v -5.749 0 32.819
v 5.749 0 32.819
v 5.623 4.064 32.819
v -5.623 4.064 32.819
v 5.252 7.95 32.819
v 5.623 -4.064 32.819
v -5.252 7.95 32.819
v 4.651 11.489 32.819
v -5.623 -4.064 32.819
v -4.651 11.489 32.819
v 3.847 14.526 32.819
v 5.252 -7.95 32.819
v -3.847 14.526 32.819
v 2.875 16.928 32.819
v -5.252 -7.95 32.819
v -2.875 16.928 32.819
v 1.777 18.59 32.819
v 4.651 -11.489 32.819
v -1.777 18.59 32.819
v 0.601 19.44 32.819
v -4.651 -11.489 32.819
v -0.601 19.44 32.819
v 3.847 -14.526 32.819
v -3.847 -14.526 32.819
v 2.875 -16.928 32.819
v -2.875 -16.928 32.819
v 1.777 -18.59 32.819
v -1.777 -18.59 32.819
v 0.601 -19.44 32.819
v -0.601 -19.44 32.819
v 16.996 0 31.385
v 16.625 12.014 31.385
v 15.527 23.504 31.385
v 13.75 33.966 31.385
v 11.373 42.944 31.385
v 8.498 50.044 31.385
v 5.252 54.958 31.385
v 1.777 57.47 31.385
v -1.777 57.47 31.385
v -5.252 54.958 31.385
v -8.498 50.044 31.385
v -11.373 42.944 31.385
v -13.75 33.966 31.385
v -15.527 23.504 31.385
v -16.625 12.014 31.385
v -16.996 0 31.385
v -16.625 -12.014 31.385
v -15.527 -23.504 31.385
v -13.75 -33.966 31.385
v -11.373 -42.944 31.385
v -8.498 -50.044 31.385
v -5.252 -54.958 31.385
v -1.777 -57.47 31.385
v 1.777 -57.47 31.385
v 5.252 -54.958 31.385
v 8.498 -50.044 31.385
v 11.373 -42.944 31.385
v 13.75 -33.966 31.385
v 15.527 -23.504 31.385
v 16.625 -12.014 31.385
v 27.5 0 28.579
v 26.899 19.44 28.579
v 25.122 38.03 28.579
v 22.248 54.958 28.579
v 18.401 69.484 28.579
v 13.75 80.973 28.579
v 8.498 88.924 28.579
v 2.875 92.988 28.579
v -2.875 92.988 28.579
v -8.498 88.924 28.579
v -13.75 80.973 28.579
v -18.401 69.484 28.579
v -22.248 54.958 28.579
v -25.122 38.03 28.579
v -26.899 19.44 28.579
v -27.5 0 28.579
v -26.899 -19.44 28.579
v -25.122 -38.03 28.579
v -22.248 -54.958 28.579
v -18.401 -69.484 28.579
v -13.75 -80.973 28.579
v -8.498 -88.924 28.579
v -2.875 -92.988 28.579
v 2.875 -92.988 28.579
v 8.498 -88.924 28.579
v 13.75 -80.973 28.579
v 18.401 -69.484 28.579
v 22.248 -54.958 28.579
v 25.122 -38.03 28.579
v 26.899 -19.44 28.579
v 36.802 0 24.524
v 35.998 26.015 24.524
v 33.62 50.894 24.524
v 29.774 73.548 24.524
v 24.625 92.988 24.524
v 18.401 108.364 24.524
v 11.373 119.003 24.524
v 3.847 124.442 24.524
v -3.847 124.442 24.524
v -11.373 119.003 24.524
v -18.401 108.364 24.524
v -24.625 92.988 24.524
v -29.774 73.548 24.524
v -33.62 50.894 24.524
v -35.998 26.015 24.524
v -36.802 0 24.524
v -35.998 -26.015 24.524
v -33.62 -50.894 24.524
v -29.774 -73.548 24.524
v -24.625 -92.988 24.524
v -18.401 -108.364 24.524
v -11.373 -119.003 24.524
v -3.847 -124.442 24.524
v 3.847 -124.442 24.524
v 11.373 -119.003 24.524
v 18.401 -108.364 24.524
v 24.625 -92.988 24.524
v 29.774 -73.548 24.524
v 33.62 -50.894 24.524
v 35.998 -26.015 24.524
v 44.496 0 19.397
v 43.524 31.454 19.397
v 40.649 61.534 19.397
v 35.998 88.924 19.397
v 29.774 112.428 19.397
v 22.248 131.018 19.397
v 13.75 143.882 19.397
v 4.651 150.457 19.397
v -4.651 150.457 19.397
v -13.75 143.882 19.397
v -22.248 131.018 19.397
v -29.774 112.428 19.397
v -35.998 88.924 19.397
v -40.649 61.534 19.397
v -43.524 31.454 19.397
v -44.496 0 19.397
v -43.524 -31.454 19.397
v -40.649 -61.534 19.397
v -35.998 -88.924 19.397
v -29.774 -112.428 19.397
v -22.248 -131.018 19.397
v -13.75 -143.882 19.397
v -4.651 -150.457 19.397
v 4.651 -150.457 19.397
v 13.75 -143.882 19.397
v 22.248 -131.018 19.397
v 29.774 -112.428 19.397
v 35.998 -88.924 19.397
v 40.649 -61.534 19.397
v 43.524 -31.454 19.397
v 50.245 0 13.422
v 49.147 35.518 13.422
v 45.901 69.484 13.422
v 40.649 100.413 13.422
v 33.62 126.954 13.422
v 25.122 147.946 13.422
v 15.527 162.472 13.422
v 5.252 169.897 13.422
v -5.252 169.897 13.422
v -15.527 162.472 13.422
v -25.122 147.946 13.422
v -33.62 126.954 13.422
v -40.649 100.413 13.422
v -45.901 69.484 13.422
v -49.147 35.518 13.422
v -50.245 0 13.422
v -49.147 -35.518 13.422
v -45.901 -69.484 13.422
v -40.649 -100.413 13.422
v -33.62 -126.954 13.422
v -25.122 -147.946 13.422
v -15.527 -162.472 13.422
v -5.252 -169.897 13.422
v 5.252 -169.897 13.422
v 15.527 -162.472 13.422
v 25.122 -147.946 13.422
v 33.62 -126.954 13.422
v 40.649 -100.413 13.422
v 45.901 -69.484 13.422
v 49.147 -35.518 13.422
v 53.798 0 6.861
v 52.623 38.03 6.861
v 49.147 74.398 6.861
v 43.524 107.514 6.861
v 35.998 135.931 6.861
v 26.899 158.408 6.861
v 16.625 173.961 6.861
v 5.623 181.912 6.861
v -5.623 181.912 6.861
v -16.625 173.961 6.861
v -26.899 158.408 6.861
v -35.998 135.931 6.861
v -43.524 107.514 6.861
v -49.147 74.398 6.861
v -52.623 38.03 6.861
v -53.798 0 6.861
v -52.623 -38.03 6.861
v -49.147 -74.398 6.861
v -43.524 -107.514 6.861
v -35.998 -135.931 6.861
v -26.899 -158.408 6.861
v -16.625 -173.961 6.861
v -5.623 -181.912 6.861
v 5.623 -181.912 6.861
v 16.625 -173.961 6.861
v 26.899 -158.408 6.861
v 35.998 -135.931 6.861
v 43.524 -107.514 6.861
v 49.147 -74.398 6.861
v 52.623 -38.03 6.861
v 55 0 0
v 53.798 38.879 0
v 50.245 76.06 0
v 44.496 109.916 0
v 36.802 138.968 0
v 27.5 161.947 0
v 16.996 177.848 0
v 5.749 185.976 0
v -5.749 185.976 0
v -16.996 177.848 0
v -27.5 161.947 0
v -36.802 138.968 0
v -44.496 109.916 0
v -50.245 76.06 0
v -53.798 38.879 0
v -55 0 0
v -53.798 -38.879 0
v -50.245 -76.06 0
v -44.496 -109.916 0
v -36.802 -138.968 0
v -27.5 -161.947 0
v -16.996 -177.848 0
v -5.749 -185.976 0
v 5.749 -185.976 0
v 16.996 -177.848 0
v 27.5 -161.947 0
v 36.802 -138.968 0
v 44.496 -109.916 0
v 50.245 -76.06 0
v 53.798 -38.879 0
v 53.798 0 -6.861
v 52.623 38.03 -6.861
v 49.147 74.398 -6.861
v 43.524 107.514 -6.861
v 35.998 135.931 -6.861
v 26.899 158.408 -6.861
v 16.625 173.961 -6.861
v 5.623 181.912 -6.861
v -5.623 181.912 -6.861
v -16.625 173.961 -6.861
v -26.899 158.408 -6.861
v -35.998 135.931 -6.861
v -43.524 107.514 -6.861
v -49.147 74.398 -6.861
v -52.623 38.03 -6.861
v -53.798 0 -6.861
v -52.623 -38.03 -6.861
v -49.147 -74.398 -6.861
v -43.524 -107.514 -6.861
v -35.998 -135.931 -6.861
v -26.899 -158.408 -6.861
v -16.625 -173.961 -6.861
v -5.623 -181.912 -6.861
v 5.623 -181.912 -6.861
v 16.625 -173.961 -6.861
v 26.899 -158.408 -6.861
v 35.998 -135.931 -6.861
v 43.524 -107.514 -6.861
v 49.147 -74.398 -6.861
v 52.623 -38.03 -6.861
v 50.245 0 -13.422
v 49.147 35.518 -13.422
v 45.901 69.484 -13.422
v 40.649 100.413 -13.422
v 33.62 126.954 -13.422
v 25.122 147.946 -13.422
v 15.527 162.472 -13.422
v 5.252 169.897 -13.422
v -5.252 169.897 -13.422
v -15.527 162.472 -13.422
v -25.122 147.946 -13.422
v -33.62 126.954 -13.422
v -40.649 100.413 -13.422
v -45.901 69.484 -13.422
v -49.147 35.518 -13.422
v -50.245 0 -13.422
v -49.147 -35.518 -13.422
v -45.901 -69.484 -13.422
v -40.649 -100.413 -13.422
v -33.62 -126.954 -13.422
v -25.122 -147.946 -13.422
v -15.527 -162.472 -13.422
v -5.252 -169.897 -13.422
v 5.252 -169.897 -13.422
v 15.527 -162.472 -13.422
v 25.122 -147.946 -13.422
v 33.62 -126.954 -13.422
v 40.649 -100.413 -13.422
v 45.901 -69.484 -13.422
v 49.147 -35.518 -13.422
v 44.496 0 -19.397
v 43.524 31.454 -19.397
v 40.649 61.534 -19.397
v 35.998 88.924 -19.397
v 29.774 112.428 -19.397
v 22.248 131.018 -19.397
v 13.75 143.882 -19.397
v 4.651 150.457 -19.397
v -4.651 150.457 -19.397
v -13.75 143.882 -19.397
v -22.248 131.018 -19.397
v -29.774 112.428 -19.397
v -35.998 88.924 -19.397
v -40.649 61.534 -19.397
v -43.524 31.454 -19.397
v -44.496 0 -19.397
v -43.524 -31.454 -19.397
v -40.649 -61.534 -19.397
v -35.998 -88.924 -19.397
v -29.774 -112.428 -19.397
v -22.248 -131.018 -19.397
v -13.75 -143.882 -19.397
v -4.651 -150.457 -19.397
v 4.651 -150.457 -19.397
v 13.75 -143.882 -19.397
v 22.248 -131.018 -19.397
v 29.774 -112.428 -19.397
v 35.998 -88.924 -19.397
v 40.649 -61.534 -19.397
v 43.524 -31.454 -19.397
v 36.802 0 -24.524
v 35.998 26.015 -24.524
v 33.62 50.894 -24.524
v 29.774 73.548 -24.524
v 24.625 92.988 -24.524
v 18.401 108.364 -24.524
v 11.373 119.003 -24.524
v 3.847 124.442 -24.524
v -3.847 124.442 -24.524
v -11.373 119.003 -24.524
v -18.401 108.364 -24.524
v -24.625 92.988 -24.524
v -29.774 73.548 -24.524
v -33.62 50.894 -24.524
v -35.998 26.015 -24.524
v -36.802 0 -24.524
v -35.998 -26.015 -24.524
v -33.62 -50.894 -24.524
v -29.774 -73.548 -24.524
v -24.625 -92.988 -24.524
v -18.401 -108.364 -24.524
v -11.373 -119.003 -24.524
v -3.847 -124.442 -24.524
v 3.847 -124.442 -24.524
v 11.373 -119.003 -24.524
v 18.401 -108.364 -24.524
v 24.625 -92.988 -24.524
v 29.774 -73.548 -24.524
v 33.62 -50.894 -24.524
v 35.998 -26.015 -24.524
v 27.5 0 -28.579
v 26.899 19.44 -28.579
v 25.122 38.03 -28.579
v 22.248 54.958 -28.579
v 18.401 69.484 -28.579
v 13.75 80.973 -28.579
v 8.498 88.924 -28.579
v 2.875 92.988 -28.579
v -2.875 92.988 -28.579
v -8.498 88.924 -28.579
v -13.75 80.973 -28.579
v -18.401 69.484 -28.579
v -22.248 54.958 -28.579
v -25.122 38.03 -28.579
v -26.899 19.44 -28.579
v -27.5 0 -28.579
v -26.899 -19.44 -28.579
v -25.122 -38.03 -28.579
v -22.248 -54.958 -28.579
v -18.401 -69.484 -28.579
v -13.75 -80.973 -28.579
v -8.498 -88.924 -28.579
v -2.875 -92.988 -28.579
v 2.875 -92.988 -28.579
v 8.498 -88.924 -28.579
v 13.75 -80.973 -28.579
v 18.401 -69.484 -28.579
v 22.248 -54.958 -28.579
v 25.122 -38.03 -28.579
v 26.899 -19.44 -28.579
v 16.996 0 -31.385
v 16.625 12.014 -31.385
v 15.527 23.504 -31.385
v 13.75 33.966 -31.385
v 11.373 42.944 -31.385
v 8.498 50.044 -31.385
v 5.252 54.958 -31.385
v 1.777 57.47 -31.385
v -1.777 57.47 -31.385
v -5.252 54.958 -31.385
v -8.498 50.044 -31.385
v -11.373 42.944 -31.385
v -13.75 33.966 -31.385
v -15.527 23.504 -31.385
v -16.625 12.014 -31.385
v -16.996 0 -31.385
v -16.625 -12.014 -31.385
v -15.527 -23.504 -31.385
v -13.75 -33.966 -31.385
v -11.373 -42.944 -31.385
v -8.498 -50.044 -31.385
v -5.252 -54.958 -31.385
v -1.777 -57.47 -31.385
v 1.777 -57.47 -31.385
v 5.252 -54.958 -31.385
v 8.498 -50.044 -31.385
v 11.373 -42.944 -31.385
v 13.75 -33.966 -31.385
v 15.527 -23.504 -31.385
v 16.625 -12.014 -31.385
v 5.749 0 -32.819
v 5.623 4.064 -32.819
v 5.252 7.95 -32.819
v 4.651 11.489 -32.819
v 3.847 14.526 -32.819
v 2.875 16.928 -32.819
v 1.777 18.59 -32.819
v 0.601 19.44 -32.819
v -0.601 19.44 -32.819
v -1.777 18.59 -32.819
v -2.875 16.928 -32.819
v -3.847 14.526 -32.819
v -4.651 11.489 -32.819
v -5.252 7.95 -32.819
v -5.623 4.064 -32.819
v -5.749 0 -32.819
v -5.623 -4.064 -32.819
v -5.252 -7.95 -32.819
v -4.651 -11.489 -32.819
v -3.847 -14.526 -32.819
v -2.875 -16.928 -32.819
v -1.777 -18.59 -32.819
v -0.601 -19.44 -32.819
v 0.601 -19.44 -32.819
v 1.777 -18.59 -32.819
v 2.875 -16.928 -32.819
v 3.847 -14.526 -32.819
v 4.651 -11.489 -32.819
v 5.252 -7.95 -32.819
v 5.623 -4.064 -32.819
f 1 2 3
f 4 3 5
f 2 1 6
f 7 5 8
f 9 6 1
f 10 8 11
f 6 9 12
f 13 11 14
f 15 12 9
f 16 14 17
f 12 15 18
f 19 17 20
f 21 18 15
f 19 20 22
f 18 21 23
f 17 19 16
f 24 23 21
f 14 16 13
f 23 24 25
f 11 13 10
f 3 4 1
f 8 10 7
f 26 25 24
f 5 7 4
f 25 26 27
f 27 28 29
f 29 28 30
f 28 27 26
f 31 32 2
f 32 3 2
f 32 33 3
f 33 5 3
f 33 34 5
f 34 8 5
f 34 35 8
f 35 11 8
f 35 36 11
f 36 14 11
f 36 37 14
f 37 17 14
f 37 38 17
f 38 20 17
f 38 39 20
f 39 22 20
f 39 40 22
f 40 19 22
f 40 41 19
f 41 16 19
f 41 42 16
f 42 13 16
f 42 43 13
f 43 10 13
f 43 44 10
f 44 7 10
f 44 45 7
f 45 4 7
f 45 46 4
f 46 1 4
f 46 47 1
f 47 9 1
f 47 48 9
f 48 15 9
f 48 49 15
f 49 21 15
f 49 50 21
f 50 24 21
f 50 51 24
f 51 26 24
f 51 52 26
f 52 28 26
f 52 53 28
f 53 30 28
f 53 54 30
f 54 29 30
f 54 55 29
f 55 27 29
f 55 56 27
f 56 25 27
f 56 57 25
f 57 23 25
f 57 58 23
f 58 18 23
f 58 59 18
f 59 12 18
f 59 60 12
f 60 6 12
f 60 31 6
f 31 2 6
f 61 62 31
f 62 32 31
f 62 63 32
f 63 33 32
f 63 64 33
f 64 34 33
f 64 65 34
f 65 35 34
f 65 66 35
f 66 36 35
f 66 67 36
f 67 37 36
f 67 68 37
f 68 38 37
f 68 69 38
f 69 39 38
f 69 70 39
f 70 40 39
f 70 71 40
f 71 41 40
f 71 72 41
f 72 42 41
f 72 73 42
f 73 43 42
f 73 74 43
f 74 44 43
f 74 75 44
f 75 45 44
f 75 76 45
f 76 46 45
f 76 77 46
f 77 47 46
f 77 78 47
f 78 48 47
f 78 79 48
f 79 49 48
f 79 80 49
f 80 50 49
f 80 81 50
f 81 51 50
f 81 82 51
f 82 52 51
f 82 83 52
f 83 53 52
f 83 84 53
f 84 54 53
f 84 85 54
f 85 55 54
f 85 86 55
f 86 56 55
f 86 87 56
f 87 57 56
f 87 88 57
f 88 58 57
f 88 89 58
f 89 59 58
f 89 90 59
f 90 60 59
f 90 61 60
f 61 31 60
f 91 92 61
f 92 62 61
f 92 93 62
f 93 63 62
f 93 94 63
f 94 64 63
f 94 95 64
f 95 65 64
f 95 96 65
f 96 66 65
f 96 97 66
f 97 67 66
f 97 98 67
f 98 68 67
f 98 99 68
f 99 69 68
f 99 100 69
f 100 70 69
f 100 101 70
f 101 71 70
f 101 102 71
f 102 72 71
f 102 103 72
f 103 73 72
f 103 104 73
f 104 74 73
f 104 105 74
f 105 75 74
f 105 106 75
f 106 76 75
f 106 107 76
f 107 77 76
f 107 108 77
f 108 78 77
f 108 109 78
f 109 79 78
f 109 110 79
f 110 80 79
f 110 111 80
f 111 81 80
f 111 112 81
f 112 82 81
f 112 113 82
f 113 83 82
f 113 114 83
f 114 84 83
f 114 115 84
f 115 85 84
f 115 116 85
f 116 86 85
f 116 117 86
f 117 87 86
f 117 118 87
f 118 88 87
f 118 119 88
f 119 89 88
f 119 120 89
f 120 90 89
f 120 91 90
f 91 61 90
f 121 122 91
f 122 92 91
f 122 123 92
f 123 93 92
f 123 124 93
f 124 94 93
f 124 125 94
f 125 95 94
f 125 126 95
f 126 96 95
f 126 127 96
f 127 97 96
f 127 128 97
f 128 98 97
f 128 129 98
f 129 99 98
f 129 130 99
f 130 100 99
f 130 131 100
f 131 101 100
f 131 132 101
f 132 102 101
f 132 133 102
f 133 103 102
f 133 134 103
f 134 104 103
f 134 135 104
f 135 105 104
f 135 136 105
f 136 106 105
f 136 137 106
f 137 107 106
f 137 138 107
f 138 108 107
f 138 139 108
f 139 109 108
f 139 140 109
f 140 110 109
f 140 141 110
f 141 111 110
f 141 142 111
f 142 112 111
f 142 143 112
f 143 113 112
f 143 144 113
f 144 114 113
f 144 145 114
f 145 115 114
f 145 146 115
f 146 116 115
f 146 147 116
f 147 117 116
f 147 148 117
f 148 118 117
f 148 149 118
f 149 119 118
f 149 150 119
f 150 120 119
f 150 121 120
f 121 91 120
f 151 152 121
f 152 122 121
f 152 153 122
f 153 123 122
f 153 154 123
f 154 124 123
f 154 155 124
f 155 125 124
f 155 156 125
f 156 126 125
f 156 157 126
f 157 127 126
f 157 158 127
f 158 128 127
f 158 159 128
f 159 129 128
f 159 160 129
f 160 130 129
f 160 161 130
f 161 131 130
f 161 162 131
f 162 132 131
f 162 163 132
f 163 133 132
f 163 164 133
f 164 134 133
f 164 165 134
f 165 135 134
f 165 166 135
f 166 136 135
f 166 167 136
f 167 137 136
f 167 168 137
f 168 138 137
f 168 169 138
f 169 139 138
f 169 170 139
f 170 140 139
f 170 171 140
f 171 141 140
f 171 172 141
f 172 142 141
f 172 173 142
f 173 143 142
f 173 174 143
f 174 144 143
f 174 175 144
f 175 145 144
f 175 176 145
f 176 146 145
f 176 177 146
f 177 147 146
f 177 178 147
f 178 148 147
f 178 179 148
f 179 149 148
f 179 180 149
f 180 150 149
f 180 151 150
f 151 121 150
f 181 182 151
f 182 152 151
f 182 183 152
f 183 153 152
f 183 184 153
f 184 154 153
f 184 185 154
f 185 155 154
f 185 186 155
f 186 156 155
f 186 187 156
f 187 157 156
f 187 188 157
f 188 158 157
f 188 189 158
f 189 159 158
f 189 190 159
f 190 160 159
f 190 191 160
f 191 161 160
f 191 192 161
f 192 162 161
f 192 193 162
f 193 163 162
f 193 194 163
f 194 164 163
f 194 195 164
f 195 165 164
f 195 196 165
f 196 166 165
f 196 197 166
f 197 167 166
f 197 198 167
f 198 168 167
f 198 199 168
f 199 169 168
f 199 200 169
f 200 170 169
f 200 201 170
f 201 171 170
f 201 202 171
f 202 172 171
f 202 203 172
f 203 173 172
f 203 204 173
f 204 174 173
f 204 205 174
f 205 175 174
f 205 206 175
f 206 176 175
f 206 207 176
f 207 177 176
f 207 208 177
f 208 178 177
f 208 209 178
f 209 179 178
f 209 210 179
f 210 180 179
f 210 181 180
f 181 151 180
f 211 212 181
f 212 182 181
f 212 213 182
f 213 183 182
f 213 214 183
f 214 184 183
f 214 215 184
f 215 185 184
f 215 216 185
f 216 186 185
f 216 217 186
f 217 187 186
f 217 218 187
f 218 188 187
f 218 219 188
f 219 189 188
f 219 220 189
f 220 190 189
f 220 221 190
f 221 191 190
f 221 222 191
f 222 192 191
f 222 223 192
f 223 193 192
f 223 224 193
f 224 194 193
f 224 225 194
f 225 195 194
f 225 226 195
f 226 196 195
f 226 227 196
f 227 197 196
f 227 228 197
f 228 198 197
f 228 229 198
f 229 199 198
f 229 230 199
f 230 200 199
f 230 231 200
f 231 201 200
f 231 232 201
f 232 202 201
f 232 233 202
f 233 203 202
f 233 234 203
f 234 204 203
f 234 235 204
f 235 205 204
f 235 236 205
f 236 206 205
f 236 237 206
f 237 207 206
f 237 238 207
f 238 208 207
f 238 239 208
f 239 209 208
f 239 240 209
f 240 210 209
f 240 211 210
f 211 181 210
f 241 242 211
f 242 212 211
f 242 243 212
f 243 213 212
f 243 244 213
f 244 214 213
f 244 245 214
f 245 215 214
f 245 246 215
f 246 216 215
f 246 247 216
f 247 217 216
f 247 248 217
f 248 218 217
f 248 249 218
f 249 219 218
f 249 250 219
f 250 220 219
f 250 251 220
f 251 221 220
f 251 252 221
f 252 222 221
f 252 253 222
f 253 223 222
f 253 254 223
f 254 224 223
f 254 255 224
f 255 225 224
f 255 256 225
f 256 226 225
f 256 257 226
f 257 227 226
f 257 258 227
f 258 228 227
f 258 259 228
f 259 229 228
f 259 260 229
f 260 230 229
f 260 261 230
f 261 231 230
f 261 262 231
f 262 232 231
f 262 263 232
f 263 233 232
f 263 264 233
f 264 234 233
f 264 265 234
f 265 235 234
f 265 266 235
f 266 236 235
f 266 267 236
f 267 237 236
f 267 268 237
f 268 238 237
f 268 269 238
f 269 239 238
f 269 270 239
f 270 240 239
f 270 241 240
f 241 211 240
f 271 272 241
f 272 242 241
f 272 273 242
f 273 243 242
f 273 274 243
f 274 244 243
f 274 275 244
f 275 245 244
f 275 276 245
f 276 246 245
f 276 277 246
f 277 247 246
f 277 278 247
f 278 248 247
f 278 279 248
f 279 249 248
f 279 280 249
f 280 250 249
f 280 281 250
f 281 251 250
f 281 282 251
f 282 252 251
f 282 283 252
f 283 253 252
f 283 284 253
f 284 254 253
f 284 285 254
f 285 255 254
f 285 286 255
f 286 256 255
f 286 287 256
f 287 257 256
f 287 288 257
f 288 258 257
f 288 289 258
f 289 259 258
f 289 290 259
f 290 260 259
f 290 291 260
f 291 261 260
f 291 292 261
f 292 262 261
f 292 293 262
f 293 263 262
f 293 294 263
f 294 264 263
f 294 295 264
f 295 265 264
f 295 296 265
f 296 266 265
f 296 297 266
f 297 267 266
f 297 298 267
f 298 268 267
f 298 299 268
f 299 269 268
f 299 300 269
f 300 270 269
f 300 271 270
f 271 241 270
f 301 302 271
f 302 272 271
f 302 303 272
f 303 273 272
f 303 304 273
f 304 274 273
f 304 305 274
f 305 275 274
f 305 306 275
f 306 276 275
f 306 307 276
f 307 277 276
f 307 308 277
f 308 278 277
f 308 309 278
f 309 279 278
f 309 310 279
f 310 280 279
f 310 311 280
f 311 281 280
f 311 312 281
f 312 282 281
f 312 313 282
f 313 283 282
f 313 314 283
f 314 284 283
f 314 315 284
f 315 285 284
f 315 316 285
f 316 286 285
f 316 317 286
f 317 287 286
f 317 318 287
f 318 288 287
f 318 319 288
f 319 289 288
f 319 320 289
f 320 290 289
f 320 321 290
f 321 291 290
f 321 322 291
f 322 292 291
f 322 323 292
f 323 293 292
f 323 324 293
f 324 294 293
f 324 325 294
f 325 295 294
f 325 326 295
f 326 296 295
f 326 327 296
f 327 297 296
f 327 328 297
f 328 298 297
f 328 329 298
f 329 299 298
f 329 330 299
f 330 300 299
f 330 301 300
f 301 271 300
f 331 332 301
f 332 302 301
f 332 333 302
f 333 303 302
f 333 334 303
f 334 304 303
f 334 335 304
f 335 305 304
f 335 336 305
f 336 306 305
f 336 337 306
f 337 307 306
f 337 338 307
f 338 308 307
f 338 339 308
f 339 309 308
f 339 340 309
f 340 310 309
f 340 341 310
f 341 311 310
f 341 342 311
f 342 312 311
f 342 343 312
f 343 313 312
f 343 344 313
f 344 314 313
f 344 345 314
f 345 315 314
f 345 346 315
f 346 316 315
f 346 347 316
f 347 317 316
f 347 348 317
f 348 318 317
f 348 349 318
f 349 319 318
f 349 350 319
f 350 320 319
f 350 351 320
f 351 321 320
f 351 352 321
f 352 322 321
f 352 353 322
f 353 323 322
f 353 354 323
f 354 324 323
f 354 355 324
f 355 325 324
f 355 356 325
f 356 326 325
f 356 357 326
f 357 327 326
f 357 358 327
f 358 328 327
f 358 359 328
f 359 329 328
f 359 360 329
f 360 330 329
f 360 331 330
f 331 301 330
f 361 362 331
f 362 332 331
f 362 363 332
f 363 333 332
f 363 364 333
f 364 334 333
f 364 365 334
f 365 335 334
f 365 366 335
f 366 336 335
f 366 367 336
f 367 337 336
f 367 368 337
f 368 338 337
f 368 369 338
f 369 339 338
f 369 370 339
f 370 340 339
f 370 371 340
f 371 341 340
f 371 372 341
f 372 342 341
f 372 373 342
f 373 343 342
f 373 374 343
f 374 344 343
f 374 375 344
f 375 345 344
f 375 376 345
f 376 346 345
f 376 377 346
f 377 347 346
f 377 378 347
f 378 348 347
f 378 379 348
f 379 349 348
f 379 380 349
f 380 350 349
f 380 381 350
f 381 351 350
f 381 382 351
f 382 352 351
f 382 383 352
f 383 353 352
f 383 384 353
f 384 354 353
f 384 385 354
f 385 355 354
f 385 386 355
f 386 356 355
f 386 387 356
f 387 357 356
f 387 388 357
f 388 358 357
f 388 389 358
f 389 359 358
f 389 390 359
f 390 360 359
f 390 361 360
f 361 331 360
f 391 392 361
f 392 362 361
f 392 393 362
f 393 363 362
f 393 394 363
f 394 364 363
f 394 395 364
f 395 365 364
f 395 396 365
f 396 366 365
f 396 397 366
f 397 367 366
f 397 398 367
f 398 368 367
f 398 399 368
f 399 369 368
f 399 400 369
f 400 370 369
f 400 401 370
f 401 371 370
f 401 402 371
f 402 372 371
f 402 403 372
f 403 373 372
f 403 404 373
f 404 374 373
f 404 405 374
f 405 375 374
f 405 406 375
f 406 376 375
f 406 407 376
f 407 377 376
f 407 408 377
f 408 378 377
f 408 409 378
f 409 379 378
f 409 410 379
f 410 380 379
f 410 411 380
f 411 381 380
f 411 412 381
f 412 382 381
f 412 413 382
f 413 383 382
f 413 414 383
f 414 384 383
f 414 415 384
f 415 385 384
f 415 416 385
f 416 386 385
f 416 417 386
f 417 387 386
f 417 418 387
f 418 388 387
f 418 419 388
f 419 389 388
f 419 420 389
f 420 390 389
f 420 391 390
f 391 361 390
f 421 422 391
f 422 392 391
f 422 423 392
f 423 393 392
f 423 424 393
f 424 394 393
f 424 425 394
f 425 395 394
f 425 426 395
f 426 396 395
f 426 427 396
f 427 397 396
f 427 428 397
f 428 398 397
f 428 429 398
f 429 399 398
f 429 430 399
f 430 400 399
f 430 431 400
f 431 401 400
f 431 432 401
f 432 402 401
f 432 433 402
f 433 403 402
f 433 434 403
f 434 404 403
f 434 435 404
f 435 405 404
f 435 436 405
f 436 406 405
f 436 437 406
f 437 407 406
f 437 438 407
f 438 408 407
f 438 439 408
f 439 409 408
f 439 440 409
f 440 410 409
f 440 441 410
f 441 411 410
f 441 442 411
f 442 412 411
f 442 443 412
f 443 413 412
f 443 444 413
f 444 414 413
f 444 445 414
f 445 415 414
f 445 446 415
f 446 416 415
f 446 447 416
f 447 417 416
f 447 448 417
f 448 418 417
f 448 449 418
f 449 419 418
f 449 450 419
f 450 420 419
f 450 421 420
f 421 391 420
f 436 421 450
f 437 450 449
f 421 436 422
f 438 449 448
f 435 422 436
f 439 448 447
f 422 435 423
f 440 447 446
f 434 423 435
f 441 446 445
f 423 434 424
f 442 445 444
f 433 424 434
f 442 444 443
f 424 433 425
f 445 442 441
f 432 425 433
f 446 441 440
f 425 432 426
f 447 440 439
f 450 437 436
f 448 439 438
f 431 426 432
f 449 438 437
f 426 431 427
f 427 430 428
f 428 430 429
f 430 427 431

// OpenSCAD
// Generated by SolidPython 1.0.1 on 2020-07-29 00:46:46


scale(v = [5, 17, 3]) {
	sphere(r = 11);
}
/***********************************************
*********      SolidPython code:      **********
************************************************
 
# import packages: SolidPython
from solid import *
from solid.utils import *
from itertools import chain, combinations, permutations


class Resize:

    def __init__(self, scad_file):
        self.scad_file = scad_file
        #self.scad_file = import_scad(scad_file)
        # cone/cylinder param:
        self.r1 = 0
        self.r2 = 0
        self.h = 0
        # rectangular prism param:
        self.w = 0
        self.l = 0
        # ellipse param:
        self.r = 0

    # import OpenScad code (file name corresponds to shape)


    # classify shape + parameters
    def assign(self, param1, param2, param3):
        if self.scad_file == 'cone.scad':
            self.r1 = param1
            self.r2 = param2
            self.h = param3
        elif self.scad_file == 'cylinder.scad':
            self.r1 = param1
            self.r2 = param2
            self.h = param3
        elif self.scad_file == 'rectangularPrism.scad':
            self.h = param1
            self.l = param2
            self.w = param3
        else:
            self.r = param1
            self.h = param2

    # resize parameters
    def iterate(self):
        x = range(3, 20, 2)
        i = 1
        if self.scad_file == 'cone.scad':
            tempList = list(permutations(x, 2))
            for temp in tempList:
                param1 = temp[0]
                param2 = temp[1]
                filepath = 'produced_scad_files/' + 'cone' + str(param1) + '_' + str(param2) + '_' + '.scad'
                scad_render_to_file(cylinder(h=param1, r1=param2, r2=0), filepath)

        elif self.scad_file == 'cylinder.scad':
            tempList = list(permutations(x, 3))
            for temp in tempList:
                param1 = temp[0]
                param2 = temp[1]
                filepath = 'produced_scad_files/' + 'cylinder' + str(param1) + '_' + str(param2) + '_' + '.scad'
                scad_render_to_file(cylinder(h=param1, r1=param2, r2=param2), filepath)

        elif self.scad_file == 'rectangularPrism.scad':
            tempList = list(permutations(x, 3))
            for temp in tempList:
                param1 = temp[0]
                param2 = temp[1]
                param3 = temp[2]
                filepath = 'produced_scad_files/' + 'rectangularPrism' + str(param1) + '_' + str(param2) + '_' + str(
                    param3) + '.scad'
                scad_render_to_file(cube(size=(param1, param2, param3)), filepath)

        elif self.scad_file == 'ellipse.scad':
            tempList = list(permutations(x, 4))
            for temp in tempList:
                param1 = temp[0]
                param2 = temp[1]
                param3 = temp[2]
                param4 = temp[3]
                filepath = 'produced_scad_files/' + 'ellipse' + str(param1) + '_' + str(param2) + '_' + str(param3) + '_' + str(param4) + '.scad'
                scad_render_to_file(scale([param1, param2, param3])(sphere(r=param4)), filepath)

    def render_to_scadfile(self):
        scad_render_to_file(scad, 'example.scad') 
 
************************************************/
